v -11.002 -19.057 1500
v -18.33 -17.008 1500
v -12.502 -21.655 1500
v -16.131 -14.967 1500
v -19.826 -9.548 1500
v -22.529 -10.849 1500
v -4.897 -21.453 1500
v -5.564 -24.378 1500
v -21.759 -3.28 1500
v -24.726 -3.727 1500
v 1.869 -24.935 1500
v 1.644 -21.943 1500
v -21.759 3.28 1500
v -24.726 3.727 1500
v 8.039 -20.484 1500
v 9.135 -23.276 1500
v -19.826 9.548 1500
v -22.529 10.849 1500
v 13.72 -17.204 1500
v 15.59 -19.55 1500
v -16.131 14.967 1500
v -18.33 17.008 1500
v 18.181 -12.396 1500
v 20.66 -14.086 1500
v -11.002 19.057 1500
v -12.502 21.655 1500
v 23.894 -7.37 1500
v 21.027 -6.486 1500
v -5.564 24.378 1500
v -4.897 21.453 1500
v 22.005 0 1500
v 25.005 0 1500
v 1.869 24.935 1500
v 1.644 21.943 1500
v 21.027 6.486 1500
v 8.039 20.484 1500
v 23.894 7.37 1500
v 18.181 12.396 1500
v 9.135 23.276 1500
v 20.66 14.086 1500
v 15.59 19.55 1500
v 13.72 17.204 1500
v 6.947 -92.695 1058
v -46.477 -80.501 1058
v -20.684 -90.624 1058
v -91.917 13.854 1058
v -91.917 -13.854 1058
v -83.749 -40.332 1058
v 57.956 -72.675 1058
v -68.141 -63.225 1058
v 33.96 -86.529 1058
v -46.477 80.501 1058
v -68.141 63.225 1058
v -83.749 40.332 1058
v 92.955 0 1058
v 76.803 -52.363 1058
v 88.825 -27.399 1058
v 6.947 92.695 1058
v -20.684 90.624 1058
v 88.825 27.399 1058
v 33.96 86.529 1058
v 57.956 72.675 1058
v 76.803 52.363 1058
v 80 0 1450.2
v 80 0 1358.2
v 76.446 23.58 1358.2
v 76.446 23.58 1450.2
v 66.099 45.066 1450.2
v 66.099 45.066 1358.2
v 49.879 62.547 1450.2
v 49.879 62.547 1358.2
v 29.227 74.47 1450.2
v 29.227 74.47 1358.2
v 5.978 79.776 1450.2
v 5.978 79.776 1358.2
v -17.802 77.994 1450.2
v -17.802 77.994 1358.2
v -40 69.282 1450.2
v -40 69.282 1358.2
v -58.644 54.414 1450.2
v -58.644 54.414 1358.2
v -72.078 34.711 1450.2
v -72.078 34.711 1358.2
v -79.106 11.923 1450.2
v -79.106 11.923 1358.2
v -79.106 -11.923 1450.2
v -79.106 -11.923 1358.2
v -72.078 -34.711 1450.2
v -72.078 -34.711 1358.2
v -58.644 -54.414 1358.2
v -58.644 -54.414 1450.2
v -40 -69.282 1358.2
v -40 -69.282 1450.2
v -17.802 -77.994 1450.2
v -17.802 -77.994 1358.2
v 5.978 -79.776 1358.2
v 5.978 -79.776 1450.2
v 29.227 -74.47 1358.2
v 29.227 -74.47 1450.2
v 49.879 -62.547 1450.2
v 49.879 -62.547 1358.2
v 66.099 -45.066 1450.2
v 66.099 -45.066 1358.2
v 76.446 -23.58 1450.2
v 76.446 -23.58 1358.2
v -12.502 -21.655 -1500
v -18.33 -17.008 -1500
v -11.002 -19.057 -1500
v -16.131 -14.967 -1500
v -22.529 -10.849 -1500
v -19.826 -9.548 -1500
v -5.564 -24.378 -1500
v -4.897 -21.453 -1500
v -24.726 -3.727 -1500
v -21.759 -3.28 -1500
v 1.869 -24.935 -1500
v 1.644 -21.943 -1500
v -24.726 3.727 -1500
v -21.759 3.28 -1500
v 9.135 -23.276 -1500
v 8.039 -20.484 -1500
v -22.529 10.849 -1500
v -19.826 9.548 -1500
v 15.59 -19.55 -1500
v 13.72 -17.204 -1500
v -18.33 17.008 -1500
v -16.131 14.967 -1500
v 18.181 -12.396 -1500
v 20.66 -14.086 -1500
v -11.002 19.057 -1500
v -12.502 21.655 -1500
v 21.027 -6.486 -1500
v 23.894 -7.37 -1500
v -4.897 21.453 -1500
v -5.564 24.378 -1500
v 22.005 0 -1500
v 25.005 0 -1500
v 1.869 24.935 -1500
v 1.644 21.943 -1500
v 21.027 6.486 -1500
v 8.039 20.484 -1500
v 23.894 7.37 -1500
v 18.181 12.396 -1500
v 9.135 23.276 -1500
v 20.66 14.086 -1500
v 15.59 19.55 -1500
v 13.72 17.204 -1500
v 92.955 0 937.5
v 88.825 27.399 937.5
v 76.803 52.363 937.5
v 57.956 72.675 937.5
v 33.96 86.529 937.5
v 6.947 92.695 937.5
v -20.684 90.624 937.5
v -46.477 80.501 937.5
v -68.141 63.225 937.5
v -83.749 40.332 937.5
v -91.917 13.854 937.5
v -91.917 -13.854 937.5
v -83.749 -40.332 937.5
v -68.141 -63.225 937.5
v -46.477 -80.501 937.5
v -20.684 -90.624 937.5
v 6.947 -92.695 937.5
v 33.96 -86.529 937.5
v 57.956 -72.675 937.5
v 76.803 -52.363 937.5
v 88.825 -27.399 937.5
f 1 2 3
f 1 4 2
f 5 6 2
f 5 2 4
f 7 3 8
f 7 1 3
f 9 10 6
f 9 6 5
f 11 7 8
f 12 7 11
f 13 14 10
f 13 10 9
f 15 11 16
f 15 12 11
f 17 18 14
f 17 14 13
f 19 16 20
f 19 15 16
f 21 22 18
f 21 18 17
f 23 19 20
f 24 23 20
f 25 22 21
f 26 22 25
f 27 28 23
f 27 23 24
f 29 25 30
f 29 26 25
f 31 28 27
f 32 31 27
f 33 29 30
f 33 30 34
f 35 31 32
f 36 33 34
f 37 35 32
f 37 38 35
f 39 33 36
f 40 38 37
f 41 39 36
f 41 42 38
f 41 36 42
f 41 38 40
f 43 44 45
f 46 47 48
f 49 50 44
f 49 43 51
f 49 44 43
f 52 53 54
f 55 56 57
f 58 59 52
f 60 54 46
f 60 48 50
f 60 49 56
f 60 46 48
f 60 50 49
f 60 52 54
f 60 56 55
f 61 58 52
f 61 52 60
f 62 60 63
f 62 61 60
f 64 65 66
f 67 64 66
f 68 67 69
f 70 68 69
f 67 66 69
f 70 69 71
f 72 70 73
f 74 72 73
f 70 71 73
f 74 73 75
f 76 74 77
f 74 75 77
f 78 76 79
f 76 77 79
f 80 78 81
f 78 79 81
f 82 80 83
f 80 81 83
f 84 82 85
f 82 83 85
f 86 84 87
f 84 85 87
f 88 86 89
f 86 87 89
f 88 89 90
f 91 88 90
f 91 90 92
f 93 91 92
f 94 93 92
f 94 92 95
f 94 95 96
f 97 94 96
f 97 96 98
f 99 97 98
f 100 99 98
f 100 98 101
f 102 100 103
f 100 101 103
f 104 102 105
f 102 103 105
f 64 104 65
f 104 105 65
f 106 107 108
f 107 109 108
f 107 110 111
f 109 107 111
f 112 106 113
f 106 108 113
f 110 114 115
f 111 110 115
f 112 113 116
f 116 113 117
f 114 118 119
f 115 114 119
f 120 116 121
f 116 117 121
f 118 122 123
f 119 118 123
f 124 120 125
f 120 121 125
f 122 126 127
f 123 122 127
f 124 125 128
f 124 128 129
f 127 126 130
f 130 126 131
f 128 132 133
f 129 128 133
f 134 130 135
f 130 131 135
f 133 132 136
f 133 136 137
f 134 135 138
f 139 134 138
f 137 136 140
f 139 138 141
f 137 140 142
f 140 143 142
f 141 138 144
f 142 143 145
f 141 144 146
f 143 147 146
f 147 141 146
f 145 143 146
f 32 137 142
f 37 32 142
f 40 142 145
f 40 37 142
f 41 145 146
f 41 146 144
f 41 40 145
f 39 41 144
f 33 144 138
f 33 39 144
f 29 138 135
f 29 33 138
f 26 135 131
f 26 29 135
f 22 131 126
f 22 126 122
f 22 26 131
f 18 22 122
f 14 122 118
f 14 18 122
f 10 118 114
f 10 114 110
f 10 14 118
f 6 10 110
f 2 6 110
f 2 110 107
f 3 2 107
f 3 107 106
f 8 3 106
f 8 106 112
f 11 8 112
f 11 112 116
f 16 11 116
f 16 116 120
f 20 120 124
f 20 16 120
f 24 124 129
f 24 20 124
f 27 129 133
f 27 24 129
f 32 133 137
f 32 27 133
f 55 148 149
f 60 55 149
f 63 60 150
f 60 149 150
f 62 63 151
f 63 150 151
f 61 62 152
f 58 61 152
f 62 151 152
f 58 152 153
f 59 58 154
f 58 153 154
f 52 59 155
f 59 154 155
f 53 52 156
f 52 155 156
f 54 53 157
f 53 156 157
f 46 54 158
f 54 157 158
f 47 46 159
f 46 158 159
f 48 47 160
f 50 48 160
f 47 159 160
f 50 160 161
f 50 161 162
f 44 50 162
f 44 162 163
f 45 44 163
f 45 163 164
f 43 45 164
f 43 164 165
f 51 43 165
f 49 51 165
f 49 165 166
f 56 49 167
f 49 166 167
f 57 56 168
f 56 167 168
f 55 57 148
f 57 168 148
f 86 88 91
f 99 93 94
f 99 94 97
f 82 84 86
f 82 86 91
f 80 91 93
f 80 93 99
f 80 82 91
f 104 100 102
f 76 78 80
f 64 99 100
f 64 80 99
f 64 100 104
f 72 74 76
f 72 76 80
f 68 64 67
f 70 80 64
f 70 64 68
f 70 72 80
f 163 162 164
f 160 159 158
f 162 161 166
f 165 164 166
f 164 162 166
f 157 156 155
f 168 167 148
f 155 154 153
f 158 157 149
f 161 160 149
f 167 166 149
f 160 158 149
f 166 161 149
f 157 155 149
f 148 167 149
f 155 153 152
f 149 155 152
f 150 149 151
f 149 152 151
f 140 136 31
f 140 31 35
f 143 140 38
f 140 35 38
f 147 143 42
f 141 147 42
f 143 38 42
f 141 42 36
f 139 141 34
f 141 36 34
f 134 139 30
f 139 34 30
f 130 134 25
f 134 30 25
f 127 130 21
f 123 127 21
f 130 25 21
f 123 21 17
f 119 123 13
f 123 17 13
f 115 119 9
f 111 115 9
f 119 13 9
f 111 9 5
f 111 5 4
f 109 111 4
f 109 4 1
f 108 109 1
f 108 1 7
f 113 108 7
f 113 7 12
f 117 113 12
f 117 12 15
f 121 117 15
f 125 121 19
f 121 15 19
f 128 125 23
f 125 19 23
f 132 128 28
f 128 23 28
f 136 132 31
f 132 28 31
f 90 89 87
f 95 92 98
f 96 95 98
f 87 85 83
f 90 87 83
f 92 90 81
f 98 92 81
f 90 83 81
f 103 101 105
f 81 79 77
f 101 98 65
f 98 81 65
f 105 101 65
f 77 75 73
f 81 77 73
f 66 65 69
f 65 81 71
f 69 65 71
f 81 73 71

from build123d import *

# Parameters (mm, degrees)
F2_R      = 25.004983
F3_DEPTH  = 1500
F4_T      = -3
F6_R      = 92.954893
F7_DEPTH  = 120.5
F9_R      = 80
F10_DEPTH = 92


with BuildPart() as f3:
    # F2 (on Top) → F3 (new body, symmetric)
    with BuildSketch(Plane.XY):
        Circle(F2_R)
    extrude(amount=F3_DEPTH, both=True)

    # F4
    f4_openings = [f3.faces().sort_by_distance(p)[0] for p in [
        (0, 0, 1500),
        (0, 0, -1500),
    ]]
    offset(amount=F4_T, openings=f4_openings)


with BuildPart() as f7:
    # F6 (on offset) → F7 (new body)
    with BuildSketch(Plane.XY.offset(937.5)):
        Circle(F6_R)
    extrude(amount=F7_DEPTH)


with BuildPart() as f10:
    # F9 (on offset) → F10 (new body)
    with BuildSketch(Plane.XY.offset(1358.2)):
        Circle(F9_R)
    extrude(amount=F10_DEPTH)


solid = Compound([f3.part, f7.part, f10.part])
